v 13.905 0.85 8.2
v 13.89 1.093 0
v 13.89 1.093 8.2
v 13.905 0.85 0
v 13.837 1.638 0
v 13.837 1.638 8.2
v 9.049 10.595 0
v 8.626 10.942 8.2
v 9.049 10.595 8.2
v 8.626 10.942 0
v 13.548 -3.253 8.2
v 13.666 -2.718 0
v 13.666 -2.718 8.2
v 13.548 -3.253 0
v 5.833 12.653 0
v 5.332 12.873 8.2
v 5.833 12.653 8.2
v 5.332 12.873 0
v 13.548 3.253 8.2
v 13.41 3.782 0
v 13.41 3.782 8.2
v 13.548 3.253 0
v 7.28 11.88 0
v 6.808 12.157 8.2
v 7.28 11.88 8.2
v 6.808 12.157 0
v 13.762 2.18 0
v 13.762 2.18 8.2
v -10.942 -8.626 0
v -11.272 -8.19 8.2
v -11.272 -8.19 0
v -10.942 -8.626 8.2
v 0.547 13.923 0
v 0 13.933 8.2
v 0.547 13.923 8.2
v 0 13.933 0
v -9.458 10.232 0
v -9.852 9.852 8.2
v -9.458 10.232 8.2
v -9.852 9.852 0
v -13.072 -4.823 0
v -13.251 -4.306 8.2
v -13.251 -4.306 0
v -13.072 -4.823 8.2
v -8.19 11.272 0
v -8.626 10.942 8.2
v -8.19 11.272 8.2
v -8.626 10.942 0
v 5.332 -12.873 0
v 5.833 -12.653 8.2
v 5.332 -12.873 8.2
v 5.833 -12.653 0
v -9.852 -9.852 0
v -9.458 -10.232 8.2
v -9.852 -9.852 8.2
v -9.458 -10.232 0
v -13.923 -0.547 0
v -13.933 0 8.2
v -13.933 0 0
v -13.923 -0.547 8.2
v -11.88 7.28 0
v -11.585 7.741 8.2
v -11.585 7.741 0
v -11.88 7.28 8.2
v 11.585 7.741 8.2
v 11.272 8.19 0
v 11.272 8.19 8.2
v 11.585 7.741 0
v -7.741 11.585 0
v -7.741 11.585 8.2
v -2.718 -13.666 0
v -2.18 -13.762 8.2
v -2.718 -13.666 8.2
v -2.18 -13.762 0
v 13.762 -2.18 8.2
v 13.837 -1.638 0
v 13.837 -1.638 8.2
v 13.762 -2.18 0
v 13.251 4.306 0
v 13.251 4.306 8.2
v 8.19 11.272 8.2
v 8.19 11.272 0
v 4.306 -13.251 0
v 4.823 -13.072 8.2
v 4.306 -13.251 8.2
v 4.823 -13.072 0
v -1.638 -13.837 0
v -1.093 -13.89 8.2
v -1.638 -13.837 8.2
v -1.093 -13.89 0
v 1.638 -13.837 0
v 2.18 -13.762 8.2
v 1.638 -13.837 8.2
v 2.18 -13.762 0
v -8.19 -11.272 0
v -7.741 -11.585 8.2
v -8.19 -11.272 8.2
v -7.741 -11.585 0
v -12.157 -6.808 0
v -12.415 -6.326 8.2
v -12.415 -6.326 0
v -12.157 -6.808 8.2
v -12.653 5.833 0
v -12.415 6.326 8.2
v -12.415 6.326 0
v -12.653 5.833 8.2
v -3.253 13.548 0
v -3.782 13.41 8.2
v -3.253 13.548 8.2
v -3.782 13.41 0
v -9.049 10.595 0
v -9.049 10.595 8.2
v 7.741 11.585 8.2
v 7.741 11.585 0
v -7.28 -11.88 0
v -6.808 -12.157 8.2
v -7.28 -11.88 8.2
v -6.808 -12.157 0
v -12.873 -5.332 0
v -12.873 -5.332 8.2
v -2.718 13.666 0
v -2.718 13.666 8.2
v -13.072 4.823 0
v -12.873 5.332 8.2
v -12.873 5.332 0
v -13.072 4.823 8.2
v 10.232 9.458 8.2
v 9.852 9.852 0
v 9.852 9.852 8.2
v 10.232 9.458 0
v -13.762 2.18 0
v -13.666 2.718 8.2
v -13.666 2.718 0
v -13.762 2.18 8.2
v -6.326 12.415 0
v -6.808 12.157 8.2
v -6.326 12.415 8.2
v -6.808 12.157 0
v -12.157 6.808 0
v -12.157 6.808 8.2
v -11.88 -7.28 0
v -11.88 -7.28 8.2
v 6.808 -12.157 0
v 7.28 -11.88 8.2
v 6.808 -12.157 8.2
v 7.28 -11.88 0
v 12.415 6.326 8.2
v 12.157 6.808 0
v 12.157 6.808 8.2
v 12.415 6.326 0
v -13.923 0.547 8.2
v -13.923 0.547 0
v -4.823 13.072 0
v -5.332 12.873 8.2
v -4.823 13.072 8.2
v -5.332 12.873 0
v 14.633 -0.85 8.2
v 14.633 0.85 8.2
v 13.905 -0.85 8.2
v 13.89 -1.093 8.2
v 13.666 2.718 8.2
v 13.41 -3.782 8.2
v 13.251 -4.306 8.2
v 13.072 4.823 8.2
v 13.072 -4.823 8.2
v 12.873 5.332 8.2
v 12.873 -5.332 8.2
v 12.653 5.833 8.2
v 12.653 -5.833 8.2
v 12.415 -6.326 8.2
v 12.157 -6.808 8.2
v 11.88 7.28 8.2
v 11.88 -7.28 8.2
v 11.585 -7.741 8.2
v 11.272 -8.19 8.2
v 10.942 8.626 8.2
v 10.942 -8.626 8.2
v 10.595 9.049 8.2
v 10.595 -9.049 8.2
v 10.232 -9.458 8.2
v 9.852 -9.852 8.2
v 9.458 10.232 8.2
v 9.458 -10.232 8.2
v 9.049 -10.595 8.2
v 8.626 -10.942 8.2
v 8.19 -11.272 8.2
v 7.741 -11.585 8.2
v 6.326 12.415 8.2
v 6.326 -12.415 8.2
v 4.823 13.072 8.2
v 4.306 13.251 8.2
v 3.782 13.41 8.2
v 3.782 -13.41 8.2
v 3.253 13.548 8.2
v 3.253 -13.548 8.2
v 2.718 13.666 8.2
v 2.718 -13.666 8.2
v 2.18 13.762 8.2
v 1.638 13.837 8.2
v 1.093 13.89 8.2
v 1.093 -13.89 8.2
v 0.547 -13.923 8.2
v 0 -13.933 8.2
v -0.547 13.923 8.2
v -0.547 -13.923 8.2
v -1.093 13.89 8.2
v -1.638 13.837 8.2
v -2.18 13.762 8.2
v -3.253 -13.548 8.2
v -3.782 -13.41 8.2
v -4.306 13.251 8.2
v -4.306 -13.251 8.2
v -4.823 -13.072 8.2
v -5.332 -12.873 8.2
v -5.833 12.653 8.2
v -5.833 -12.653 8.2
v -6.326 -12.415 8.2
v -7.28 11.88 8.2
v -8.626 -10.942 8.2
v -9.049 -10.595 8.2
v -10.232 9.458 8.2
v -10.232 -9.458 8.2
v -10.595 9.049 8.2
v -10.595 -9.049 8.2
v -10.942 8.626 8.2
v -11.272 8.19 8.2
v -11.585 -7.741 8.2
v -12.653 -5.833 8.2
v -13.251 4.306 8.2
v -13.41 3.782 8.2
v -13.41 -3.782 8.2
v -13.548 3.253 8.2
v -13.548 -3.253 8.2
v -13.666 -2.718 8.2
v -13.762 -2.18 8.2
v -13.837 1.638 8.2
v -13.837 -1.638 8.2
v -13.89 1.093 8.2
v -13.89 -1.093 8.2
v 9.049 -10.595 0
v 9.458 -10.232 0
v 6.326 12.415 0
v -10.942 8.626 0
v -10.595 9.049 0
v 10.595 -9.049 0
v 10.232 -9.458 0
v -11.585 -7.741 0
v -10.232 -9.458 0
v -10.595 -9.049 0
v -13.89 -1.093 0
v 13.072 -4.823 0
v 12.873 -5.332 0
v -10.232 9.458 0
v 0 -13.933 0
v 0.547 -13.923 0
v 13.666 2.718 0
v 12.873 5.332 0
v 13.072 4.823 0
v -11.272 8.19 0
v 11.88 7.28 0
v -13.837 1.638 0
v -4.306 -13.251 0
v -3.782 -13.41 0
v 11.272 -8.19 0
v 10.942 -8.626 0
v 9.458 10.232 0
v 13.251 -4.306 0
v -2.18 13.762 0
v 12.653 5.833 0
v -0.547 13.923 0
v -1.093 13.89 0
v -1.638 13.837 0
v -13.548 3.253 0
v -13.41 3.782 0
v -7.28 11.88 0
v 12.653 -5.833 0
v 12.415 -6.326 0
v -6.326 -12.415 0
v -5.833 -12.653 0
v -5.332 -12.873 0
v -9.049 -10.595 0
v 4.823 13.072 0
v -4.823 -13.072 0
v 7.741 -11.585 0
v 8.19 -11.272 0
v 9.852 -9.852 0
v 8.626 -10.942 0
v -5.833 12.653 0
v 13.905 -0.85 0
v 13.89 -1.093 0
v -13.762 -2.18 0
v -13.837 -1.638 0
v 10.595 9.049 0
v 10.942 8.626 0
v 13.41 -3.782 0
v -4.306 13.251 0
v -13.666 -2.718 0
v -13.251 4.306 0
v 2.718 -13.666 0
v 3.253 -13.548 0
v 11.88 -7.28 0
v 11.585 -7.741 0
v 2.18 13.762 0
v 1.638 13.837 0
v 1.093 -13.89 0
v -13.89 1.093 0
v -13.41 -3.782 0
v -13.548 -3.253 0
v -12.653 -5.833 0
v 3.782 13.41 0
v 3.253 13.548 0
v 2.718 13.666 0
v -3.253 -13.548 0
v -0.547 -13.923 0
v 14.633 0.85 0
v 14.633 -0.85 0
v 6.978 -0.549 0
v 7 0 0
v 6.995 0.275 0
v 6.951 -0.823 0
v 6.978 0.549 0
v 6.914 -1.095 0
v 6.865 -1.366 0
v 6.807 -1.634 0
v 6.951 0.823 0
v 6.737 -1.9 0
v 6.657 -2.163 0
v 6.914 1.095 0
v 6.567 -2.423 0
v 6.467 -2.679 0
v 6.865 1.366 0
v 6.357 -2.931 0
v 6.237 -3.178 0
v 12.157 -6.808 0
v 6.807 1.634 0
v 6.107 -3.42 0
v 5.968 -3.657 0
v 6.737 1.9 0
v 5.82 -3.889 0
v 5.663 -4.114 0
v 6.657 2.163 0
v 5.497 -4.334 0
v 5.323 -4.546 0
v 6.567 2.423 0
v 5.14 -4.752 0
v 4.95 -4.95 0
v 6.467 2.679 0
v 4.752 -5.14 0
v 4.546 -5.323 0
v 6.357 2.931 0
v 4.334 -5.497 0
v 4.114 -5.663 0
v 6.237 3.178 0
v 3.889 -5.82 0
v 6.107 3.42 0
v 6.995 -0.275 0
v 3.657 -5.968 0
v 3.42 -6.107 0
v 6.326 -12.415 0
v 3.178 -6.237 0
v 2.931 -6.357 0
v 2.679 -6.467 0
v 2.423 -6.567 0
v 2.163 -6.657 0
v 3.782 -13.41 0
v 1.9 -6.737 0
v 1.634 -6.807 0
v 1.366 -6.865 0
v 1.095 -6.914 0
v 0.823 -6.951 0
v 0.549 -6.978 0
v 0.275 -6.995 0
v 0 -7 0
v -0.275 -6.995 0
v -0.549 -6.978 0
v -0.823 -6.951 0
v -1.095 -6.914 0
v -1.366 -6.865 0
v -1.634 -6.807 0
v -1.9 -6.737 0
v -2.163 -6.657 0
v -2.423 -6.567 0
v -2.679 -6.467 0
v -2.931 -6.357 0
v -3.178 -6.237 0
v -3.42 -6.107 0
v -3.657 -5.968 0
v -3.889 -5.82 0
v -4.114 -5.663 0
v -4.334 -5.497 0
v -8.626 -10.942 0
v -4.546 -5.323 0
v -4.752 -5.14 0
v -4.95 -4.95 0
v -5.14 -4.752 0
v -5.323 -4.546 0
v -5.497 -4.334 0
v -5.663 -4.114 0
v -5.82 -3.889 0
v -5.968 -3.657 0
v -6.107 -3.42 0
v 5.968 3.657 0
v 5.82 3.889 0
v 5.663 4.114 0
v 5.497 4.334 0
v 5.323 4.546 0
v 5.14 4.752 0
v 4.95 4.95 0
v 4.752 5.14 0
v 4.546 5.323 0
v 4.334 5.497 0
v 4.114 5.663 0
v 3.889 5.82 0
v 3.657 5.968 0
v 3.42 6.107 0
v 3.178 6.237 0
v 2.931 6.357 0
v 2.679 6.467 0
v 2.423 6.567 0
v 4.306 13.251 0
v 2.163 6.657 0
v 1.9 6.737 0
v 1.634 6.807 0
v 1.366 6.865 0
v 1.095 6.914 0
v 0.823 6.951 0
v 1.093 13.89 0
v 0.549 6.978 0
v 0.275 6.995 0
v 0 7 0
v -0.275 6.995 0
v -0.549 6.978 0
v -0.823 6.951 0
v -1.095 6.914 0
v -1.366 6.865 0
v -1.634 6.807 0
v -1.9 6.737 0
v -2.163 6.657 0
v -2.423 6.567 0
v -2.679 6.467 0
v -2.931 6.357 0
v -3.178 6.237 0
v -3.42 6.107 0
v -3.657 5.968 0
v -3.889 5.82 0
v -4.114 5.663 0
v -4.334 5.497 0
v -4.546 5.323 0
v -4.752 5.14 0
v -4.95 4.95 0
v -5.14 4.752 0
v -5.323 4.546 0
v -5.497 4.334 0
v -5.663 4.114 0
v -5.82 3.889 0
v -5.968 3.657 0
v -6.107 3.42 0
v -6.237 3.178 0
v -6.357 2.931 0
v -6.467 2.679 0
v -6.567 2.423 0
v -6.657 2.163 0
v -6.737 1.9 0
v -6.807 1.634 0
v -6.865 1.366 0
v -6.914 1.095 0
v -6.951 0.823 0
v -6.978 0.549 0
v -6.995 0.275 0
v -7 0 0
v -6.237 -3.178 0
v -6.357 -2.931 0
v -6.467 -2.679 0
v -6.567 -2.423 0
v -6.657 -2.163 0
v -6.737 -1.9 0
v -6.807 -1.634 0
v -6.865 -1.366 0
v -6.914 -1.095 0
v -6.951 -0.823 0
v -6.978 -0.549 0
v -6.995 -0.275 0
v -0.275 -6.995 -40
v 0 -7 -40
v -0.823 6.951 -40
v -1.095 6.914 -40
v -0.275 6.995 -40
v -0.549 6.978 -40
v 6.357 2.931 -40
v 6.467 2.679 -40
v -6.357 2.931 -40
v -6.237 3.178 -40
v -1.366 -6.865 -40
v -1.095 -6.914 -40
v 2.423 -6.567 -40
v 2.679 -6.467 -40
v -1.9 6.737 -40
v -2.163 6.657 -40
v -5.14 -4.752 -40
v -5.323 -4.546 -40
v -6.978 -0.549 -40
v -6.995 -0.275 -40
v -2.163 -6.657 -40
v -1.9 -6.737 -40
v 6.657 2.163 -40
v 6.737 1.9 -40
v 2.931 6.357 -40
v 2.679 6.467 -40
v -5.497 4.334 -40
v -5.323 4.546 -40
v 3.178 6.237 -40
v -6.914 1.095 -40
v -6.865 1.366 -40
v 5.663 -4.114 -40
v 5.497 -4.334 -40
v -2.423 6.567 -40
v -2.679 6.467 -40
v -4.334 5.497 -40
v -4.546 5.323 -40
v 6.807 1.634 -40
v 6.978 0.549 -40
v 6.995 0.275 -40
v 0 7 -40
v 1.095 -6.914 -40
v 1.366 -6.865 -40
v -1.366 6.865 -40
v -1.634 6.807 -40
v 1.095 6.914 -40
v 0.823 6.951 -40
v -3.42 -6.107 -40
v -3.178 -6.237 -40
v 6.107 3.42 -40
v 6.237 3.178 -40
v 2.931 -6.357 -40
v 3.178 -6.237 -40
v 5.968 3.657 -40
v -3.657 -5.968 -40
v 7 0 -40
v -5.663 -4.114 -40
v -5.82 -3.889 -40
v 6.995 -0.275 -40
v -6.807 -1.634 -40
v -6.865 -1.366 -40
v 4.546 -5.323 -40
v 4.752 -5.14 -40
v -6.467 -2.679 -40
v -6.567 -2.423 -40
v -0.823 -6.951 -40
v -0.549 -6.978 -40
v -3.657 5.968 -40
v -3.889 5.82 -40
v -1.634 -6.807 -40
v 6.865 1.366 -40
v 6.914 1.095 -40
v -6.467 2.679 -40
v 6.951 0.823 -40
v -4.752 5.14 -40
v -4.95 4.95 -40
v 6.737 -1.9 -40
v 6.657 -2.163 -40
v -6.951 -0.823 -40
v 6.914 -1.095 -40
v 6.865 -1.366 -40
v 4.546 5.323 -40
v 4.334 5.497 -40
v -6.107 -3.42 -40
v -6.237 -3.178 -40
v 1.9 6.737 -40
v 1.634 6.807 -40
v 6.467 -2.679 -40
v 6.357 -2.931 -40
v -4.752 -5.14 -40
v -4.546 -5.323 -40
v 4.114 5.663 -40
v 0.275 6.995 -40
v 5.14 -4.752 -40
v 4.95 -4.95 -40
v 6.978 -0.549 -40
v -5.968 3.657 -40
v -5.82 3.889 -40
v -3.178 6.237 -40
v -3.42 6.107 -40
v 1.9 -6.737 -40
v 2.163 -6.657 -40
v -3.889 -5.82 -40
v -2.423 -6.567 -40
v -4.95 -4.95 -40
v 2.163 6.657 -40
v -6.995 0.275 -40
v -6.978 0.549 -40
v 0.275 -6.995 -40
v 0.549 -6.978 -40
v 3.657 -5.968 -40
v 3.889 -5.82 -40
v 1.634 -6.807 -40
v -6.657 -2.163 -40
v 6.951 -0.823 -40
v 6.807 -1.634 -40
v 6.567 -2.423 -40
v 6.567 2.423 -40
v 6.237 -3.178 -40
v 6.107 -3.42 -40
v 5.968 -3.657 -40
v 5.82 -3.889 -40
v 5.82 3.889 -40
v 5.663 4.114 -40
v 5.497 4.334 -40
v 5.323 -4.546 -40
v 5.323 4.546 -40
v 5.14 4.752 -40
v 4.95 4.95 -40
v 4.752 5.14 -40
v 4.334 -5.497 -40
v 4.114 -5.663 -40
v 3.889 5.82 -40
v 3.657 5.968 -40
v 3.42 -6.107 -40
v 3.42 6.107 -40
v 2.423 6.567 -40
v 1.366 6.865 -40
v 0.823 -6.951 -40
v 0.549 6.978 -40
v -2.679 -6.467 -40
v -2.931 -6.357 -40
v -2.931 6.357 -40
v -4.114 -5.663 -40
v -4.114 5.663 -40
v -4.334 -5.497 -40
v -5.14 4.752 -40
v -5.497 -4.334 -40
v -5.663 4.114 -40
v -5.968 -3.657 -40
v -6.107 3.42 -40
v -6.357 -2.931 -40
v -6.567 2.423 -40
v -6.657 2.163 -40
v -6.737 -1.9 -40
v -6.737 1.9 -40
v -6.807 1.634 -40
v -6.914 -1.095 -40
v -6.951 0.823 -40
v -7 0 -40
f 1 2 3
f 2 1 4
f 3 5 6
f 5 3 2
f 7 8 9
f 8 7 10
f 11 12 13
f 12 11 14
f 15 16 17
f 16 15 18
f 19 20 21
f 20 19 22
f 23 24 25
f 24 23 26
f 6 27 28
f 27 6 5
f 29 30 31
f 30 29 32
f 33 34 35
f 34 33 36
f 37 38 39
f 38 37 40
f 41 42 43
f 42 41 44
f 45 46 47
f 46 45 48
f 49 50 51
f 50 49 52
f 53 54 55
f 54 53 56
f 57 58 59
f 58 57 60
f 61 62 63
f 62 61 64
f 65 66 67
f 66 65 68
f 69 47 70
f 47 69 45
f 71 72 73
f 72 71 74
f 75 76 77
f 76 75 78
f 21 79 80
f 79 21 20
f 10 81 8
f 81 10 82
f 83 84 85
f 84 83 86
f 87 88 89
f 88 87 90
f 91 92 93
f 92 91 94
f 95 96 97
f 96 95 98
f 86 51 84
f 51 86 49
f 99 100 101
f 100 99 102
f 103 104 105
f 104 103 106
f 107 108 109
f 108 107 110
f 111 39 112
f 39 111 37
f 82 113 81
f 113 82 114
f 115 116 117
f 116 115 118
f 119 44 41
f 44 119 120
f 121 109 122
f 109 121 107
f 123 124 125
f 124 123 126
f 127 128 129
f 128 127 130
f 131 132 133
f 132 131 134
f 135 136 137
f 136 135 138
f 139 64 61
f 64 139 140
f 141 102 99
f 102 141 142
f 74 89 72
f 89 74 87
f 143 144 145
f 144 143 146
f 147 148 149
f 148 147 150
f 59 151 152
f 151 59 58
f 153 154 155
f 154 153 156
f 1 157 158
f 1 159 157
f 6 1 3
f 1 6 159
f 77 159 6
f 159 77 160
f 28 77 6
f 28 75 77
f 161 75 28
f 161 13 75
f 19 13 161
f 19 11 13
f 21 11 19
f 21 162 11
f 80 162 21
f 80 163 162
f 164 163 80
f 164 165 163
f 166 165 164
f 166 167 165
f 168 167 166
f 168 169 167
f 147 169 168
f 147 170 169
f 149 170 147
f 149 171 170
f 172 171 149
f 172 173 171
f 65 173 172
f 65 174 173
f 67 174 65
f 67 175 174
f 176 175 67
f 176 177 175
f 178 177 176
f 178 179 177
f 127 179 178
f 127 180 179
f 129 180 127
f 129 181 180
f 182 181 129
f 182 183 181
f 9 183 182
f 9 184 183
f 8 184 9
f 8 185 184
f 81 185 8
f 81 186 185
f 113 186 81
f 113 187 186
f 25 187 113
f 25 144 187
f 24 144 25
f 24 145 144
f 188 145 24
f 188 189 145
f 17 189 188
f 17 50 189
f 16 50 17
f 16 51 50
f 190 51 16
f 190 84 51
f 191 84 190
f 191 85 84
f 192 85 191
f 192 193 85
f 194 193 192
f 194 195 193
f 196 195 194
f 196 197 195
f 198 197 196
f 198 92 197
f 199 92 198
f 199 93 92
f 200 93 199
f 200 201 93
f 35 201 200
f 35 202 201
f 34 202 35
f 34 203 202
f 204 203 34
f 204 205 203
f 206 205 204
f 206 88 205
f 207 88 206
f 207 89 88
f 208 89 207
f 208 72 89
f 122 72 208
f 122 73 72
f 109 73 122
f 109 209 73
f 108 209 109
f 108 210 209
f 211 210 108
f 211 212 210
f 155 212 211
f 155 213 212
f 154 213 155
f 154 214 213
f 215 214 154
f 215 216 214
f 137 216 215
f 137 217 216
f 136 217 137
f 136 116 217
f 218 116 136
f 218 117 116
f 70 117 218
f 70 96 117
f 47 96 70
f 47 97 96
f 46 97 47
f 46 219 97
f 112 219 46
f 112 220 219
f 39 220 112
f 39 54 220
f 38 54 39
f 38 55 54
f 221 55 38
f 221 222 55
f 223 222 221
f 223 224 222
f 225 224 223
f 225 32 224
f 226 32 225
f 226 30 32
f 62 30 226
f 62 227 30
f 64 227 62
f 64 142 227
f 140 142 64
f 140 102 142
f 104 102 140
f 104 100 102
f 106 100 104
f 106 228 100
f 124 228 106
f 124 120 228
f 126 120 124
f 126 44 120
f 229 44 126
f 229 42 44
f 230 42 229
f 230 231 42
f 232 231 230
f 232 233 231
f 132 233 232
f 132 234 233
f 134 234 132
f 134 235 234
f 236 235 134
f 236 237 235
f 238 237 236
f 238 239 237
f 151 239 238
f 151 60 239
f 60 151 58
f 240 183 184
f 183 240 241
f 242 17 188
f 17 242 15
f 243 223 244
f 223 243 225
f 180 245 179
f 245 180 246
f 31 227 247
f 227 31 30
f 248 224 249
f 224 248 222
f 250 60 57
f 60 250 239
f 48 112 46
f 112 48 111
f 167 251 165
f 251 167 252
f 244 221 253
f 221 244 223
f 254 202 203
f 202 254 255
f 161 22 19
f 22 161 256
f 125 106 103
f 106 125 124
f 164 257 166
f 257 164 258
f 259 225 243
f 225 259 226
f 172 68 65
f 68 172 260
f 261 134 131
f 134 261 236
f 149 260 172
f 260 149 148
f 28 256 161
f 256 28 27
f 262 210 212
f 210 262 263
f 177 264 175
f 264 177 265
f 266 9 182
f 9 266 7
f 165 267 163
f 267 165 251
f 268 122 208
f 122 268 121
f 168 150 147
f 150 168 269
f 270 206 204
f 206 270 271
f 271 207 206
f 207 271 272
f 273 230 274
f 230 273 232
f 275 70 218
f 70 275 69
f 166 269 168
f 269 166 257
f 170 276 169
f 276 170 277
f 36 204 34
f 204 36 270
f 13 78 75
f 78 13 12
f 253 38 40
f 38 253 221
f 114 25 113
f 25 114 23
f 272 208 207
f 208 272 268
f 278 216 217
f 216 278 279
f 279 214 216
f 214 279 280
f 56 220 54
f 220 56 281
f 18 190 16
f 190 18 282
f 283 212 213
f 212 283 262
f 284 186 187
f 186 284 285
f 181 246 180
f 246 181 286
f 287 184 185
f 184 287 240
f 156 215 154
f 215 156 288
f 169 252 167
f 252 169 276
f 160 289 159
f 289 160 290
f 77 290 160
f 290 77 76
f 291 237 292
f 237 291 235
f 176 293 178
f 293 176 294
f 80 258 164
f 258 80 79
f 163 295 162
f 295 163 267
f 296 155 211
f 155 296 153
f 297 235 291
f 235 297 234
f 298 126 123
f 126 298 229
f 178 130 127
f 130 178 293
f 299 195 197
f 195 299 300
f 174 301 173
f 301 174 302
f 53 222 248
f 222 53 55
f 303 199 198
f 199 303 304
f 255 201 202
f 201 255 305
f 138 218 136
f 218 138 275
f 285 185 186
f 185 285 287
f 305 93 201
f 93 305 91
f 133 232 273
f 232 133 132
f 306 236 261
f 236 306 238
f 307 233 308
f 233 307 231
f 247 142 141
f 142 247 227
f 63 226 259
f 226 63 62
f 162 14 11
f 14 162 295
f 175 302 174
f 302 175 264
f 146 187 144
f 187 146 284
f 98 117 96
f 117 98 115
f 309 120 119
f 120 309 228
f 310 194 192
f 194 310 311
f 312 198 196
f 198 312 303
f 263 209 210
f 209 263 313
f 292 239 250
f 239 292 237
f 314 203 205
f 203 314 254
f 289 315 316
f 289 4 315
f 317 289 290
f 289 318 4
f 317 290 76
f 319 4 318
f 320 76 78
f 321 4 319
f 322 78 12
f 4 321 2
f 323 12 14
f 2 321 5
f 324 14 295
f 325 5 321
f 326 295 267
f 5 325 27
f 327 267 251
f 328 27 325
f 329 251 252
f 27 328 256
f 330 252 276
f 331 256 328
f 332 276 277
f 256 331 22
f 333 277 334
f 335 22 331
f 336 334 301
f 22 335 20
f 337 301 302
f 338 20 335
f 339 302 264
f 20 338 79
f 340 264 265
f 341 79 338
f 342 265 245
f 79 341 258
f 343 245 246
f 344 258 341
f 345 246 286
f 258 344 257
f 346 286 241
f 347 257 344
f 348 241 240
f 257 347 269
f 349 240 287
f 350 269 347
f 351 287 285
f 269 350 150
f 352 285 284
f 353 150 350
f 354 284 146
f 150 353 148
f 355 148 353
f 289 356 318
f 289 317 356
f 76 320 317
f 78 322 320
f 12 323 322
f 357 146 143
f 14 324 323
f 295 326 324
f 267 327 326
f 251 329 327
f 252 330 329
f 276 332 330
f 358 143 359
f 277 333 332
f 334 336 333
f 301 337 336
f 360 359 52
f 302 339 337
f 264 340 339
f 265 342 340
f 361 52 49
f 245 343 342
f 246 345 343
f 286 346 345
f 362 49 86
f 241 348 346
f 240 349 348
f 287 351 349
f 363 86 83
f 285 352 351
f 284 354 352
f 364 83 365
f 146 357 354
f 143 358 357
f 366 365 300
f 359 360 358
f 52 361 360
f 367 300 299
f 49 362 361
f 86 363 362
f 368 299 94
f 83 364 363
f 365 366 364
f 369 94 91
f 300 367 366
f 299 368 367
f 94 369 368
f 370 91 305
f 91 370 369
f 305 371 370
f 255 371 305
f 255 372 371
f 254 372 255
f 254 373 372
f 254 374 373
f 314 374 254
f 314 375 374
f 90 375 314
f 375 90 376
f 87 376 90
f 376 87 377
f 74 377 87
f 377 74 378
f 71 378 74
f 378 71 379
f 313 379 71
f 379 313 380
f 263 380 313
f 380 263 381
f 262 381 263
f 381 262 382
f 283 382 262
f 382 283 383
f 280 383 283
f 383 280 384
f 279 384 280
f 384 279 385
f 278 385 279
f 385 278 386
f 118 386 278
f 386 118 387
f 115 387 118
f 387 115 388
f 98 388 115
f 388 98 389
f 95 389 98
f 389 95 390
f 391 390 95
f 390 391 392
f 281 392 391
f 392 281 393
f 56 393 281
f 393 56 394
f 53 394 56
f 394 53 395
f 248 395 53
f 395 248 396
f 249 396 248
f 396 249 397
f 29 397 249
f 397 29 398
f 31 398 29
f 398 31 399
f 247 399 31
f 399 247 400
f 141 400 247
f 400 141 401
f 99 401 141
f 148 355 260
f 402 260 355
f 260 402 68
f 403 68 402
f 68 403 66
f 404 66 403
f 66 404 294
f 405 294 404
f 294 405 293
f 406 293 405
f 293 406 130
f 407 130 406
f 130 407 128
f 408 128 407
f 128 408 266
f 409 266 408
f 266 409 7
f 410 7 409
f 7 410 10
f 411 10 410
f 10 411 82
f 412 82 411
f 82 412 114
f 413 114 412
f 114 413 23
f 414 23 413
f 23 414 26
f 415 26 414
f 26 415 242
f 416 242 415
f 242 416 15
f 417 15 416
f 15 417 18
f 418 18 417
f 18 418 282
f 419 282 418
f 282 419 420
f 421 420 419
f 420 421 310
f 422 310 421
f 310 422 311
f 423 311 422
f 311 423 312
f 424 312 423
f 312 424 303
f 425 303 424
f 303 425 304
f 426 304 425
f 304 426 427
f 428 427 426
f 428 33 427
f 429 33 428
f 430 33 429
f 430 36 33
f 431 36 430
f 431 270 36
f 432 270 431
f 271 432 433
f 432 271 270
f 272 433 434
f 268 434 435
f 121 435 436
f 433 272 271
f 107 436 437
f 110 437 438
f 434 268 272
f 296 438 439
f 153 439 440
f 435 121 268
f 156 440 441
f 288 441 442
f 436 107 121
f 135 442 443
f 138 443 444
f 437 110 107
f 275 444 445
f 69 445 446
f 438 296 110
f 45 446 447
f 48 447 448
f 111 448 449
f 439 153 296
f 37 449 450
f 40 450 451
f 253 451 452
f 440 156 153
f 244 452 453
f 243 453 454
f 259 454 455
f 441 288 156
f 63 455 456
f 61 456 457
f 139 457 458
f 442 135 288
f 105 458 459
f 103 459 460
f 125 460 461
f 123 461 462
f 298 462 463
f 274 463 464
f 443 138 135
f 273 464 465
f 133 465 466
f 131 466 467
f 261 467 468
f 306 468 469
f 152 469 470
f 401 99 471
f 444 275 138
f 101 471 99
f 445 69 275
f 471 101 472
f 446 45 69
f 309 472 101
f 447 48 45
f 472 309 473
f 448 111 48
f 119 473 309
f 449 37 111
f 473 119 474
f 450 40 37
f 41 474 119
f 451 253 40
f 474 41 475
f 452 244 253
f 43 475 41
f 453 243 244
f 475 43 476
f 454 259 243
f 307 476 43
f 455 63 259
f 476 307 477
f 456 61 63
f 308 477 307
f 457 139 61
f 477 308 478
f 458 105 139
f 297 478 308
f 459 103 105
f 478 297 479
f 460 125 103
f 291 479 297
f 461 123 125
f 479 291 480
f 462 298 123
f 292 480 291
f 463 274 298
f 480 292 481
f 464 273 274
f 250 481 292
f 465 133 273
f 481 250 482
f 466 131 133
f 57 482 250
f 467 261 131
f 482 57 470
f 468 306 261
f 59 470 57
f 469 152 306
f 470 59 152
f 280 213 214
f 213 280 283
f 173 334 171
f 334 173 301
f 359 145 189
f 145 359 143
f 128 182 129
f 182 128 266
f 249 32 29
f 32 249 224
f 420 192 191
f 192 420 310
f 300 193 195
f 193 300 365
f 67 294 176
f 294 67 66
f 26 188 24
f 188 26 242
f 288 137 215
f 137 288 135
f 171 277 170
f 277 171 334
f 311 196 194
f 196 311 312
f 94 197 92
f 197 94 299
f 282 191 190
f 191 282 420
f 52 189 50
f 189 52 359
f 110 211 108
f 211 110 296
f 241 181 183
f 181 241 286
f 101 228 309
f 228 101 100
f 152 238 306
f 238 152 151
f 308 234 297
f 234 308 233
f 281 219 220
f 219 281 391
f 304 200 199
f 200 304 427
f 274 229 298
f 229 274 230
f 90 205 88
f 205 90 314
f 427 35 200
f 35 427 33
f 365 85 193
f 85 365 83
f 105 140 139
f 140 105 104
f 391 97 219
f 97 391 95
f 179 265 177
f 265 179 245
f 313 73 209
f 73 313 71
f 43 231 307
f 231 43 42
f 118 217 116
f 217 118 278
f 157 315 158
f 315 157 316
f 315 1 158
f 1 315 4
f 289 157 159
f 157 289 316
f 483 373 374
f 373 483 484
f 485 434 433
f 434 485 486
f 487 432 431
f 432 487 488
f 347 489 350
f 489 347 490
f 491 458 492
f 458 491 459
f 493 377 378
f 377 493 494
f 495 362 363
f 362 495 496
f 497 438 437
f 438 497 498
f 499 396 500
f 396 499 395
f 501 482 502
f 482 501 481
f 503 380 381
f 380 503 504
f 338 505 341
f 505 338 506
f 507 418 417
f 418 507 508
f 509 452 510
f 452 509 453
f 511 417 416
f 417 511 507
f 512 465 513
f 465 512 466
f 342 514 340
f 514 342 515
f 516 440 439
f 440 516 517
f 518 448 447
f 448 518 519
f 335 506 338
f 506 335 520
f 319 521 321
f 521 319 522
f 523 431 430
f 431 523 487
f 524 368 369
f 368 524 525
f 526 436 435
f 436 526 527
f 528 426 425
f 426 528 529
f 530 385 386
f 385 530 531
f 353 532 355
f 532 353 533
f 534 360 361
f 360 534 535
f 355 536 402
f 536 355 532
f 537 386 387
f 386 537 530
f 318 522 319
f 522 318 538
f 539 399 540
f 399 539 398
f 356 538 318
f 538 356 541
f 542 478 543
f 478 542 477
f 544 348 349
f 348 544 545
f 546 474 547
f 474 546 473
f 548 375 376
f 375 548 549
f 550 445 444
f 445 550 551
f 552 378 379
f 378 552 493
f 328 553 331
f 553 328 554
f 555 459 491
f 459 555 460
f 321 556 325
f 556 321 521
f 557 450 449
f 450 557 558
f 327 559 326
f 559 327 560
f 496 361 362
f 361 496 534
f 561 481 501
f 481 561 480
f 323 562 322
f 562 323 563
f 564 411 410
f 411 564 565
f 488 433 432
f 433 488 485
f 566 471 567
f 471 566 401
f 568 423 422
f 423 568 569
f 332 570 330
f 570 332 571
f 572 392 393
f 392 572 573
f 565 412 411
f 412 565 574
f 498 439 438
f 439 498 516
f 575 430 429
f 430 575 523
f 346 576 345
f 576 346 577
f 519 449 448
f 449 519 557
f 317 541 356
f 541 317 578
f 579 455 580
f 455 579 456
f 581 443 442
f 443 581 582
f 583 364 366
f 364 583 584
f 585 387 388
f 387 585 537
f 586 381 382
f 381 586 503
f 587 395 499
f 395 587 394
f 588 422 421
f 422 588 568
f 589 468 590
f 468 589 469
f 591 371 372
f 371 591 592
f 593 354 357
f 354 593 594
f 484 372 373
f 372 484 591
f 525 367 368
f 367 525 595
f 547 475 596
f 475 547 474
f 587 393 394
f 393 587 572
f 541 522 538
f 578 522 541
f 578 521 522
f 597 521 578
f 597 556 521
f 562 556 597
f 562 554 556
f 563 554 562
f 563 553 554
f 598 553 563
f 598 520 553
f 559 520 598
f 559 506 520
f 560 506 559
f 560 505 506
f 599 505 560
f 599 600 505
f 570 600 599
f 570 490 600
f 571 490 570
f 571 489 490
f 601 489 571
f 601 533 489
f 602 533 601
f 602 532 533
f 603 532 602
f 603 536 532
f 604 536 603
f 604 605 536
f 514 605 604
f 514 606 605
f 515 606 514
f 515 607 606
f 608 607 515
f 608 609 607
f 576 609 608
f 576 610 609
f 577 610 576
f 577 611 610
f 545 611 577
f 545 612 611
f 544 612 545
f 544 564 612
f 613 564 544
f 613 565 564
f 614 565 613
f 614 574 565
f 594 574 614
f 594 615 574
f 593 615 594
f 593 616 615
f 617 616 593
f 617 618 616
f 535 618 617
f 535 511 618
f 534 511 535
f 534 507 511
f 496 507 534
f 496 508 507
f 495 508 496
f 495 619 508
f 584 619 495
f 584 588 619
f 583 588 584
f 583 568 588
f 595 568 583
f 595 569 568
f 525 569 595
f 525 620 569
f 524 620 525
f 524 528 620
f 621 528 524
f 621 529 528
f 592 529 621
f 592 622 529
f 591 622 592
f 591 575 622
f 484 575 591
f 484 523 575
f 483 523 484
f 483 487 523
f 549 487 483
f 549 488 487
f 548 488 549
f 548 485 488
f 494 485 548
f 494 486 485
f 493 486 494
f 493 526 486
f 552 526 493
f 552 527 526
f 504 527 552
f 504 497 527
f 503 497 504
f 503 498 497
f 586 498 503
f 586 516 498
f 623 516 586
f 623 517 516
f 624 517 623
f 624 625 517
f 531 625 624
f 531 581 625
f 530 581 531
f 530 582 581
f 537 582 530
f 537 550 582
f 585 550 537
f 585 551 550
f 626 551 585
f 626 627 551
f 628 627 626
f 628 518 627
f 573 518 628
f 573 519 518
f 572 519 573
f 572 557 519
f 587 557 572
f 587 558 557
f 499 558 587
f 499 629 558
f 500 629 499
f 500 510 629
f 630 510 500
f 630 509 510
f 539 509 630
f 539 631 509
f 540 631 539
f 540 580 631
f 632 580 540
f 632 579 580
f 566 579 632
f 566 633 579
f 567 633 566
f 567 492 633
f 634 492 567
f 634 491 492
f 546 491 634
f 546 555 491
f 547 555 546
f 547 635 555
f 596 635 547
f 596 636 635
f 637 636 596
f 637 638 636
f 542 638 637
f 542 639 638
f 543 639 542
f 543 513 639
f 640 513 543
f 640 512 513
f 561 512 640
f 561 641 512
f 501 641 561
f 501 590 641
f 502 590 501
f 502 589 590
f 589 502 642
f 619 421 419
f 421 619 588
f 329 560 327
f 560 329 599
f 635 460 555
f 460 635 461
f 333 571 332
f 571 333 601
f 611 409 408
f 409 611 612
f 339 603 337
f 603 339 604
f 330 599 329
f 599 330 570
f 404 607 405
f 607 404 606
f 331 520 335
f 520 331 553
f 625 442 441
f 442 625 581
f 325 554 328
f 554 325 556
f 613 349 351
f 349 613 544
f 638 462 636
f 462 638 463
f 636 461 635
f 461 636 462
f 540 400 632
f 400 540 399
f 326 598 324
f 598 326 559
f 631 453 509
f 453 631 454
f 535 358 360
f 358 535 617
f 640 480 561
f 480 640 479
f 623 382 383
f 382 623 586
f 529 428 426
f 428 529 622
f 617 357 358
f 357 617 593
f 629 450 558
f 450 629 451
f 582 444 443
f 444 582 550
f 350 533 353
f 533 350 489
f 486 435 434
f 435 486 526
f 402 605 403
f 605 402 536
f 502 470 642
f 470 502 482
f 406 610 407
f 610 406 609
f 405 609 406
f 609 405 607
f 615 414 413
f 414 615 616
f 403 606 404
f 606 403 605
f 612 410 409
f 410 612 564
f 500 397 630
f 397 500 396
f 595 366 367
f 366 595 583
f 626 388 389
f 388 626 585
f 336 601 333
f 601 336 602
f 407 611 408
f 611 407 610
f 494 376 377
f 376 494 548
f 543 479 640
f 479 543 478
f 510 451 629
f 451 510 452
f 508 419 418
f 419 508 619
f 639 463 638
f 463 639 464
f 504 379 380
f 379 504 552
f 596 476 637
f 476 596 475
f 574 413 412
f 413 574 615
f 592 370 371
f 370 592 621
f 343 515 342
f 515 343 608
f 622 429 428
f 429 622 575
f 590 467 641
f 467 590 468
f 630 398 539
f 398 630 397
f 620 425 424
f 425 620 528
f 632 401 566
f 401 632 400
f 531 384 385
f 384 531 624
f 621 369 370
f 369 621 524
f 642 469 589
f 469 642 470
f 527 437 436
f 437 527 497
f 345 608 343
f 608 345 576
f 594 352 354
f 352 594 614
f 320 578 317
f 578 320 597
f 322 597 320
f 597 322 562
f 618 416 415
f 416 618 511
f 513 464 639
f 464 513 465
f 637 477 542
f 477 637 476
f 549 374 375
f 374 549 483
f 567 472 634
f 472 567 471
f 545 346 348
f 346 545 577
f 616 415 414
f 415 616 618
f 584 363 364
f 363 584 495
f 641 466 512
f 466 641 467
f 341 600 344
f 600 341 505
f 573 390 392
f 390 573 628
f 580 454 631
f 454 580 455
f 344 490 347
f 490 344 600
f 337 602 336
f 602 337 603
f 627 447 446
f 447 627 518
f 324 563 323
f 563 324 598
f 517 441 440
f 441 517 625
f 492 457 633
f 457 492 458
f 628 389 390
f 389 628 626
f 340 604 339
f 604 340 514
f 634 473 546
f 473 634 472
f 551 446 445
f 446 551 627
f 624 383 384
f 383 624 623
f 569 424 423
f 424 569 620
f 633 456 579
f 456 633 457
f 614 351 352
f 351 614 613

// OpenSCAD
// file: motor_lib.scad
// Biblioteca del motor DronSwarm (M6). Las medidas vienen de <dron>_motor_params.scad (generado). Unidades: mm.
// Sin hull/minkowski (CLAUDE.md): todo con cilindros, polígonos y extrusiones.
$fn = 160;

// ---------- láser ----------
module stator_lamination_2d() {           // lámina del estator: 0.2 mm de acero al silicio (NO20)
    difference() {
        circle(r = r_s);
        circle(r = r_bore);
        for (s = slots) polygon(s);
        translate([r_bore - 0.01, -1.0]) square([1.2, 2.0]);                 // chaveta: alinea las láminas y fija al tubo
    }
}
module rotor_ring_2d() {                  // anillo del rotor: acero común 1 mm, se apilan n_ring
    difference() {
        circle(r = r_out);
        circle(r = r_mag_out + fit_slide / 2);
        translate([r_mag_out, -0.75]) square([0.8, 1.5]);                     // marca de orientación (polo 1)
    }
}

// ---------- impresas ----------
module cap() {                            // tapa: lleva la hélice y el eje; el anillo del rotor entra 2 mm en la ranura
    hub_r = shaft / 2 + 3.5;
    difference() {
        union() {
            cylinder(r = r_out + 1.2, h = cap_t);
            translate([0, 0, -2]) difference() {                                 // pollera que abraza el anillo
                cylinder(r = r_out + 1.2, h = 2);
                translate([0, 0, -0.1]) cylinder(r = r_out + print_clear / 2, h = 2.2);
            }
            cylinder(r = hub_r, h = cap_t + 4);                                  // cubo del eje
        }
        translate([0, 0, -1]) cylinder(d = shaft + fit_press, h = cap_t + 6);   // eje a presión
        translate([0, 0, cap_t + 2]) rotate([0, 90, 0]) cylinder(d = 2.6, h = hub_r + 1);   // prisionero M3
        for (i = [0 : prop_n - 1]) rotate(360 / prop_n * i + 45)
            translate([prop_pcd / 2, 0, -1]) cylinder(d = prop_bolt, h = cap_t + 6);
        for (i = [0 : prop_n - 1]) rotate(360 / prop_n * i)                      // ventilación entre los tornillos de la hélice
            translate([0, 0, -1]) linear_extrude(cap_t + 2)
                polygon([[ (hub_r + 2) * cos(-14), (hub_r + 2) * sin(-14)], [ (r_mag_in - 3) * cos(-18), (r_mag_in - 3) * sin(-18)],
                         [ (r_mag_in - 3) * cos(18), (r_mag_in - 3) * sin(18)], [ (hub_r + 2) * cos(14), (hub_r + 2) * sin(14)]]);
    }
}

module base() {                           // base: tubo con los 2 rodamientos, sostiene el estator, se atornilla al DMI
    tube_h = l_stack + 2 * overhang + 1;
    difference() {
        union() {
            cylinder(r = max(r_bore + 5, dmi_pcd / 2 + 4), h = base_t);
            cylinder(r = r_bore + fit_press / 2, h = base_t + tube_h);               // el estator se pega sobre el tubo
            translate([r_bore - 0.2, -0.9, base_t]) cube([1.0, 1.8, tube_h]);        // chaveta (entra en la muesca de las láminas)
        }
        translate([0, 0, -1]) cylinder(d = bearing_od + fit_press, h = bearing_w + 1);                  // rodamiento inferior
        translate([0, 0, base_t + tube_h - bearing_w]) cylinder(d = bearing_od + fit_press, h = bearing_w + 1); // superior
        translate([0, 0, -1]) cylinder(d = shaft + 1.0, h = base_t + tube_h + 2);
        for (i = [0 : dmi_n - 1]) rotate(360 / dmi_n * i + 45) translate([dmi_pcd / 2, 0, -1]) cylinder(d = dmi_bolt, h = base_t + 2);
        translate([r_bore - 4, -2, -1]) cube([6, 4, base_t + 2]);                 // salida de los 3 cables de fase
    }
}

module magnet_jig() {                     // peine: se mete dentro del anillo y deja cada imán en su lugar (paso de polo exacto)
    rib = 2 * PI * r_mag_in / poles - magnet_w;      // espacio entre imanes en el diámetro interior
    difference() {
        union() {
            cylinder(r = r_mag_in - 0.15, h = l_stack + 4);
            for (i = [0 : poles - 1]) rotate(360 / poles * (i + 0.5))
                translate([r_mag_in - 0.5, -max(rib, 0.6) / 2, 0]) cube([h_magnet + 0.3, max(rib, 0.6) - 0.15, l_stack + 4]);
        }
        translate([0, 0, -1]) cylinder(r = r_mag_in - 3, h = l_stack + 6);
    }
}

module stack_mandrel() {                  // mandril de apilado: alinea las láminas por el agujero y la chaveta mientras cura el adhesivo
    difference() {
        union() {
            cylinder(r = r_bore - 0.05, h = l_stack + 10);
            translate([r_bore - 0.3, -0.9, 0]) cube([1.0, 1.8, l_stack + 10]);
            cylinder(r = r_s + 3, h = 3);
        }
        translate([0, 0, -1]) cylinder(d = 5.5, h = l_stack + 12);                // varilla roscada M5 para prensar
    }
}

module winding_holder() {                 // soporte para bobinar a mano: sujeta el estator por el agujero, con mango
    union() {
        cylinder(r = r_bore - 0.1, h = l_stack + 2);
        translate([r_bore - 0.4, -0.85, 0]) cube([1.0, 1.7, l_stack + 2]);
        translate([0, 0, -40]) cylinder(r = 7, h = 40);
    }
}

// ---------- ensamble (para ver) ----------
module assembly() {
    color("#b0b0b0") translate([0, 0, base_t + overhang]) linear_extrude(l_stack) stator_lamination_2d();
    color("#b87333") for (s = slots) translate([0, 0, base_t + 0.5]) linear_extrude(l_stack + 2 * overhang - 1) offset(r = -0.35) polygon(s);
    color("#4a4a4a") translate([0, 0, base_t + overhang - 1]) linear_extrude(l_stack + 2) rotor_ring_2d();
    color("#2a78d6") for (i = [0 : poles - 1]) rotate(360 / poles * i)
        translate([0, 0, base_t + overhang]) rotate_extrude(angle = 360 / poles * pole_arc)
            translate([r_mag_in, 0]) square([h_magnet, l_stack]);
    color("#eb6834") translate([0, 0, base_t + 2 * overhang + l_stack + 1]) cap();
    color("#eb6834", 0.9) base();
    color("#dddddd") translate([0, 0, -6]) cylinder(d = shaft, h = base_t + 2 * overhang + l_stack + cap_t + 14);
}
// main file
// DS-I · soporte_bobinado (M6). Generado por motor/fabricacion/gen_cad.py
include <ds_i_motor_params.scad>
include <motor_lib.scad>
winding_holder();
